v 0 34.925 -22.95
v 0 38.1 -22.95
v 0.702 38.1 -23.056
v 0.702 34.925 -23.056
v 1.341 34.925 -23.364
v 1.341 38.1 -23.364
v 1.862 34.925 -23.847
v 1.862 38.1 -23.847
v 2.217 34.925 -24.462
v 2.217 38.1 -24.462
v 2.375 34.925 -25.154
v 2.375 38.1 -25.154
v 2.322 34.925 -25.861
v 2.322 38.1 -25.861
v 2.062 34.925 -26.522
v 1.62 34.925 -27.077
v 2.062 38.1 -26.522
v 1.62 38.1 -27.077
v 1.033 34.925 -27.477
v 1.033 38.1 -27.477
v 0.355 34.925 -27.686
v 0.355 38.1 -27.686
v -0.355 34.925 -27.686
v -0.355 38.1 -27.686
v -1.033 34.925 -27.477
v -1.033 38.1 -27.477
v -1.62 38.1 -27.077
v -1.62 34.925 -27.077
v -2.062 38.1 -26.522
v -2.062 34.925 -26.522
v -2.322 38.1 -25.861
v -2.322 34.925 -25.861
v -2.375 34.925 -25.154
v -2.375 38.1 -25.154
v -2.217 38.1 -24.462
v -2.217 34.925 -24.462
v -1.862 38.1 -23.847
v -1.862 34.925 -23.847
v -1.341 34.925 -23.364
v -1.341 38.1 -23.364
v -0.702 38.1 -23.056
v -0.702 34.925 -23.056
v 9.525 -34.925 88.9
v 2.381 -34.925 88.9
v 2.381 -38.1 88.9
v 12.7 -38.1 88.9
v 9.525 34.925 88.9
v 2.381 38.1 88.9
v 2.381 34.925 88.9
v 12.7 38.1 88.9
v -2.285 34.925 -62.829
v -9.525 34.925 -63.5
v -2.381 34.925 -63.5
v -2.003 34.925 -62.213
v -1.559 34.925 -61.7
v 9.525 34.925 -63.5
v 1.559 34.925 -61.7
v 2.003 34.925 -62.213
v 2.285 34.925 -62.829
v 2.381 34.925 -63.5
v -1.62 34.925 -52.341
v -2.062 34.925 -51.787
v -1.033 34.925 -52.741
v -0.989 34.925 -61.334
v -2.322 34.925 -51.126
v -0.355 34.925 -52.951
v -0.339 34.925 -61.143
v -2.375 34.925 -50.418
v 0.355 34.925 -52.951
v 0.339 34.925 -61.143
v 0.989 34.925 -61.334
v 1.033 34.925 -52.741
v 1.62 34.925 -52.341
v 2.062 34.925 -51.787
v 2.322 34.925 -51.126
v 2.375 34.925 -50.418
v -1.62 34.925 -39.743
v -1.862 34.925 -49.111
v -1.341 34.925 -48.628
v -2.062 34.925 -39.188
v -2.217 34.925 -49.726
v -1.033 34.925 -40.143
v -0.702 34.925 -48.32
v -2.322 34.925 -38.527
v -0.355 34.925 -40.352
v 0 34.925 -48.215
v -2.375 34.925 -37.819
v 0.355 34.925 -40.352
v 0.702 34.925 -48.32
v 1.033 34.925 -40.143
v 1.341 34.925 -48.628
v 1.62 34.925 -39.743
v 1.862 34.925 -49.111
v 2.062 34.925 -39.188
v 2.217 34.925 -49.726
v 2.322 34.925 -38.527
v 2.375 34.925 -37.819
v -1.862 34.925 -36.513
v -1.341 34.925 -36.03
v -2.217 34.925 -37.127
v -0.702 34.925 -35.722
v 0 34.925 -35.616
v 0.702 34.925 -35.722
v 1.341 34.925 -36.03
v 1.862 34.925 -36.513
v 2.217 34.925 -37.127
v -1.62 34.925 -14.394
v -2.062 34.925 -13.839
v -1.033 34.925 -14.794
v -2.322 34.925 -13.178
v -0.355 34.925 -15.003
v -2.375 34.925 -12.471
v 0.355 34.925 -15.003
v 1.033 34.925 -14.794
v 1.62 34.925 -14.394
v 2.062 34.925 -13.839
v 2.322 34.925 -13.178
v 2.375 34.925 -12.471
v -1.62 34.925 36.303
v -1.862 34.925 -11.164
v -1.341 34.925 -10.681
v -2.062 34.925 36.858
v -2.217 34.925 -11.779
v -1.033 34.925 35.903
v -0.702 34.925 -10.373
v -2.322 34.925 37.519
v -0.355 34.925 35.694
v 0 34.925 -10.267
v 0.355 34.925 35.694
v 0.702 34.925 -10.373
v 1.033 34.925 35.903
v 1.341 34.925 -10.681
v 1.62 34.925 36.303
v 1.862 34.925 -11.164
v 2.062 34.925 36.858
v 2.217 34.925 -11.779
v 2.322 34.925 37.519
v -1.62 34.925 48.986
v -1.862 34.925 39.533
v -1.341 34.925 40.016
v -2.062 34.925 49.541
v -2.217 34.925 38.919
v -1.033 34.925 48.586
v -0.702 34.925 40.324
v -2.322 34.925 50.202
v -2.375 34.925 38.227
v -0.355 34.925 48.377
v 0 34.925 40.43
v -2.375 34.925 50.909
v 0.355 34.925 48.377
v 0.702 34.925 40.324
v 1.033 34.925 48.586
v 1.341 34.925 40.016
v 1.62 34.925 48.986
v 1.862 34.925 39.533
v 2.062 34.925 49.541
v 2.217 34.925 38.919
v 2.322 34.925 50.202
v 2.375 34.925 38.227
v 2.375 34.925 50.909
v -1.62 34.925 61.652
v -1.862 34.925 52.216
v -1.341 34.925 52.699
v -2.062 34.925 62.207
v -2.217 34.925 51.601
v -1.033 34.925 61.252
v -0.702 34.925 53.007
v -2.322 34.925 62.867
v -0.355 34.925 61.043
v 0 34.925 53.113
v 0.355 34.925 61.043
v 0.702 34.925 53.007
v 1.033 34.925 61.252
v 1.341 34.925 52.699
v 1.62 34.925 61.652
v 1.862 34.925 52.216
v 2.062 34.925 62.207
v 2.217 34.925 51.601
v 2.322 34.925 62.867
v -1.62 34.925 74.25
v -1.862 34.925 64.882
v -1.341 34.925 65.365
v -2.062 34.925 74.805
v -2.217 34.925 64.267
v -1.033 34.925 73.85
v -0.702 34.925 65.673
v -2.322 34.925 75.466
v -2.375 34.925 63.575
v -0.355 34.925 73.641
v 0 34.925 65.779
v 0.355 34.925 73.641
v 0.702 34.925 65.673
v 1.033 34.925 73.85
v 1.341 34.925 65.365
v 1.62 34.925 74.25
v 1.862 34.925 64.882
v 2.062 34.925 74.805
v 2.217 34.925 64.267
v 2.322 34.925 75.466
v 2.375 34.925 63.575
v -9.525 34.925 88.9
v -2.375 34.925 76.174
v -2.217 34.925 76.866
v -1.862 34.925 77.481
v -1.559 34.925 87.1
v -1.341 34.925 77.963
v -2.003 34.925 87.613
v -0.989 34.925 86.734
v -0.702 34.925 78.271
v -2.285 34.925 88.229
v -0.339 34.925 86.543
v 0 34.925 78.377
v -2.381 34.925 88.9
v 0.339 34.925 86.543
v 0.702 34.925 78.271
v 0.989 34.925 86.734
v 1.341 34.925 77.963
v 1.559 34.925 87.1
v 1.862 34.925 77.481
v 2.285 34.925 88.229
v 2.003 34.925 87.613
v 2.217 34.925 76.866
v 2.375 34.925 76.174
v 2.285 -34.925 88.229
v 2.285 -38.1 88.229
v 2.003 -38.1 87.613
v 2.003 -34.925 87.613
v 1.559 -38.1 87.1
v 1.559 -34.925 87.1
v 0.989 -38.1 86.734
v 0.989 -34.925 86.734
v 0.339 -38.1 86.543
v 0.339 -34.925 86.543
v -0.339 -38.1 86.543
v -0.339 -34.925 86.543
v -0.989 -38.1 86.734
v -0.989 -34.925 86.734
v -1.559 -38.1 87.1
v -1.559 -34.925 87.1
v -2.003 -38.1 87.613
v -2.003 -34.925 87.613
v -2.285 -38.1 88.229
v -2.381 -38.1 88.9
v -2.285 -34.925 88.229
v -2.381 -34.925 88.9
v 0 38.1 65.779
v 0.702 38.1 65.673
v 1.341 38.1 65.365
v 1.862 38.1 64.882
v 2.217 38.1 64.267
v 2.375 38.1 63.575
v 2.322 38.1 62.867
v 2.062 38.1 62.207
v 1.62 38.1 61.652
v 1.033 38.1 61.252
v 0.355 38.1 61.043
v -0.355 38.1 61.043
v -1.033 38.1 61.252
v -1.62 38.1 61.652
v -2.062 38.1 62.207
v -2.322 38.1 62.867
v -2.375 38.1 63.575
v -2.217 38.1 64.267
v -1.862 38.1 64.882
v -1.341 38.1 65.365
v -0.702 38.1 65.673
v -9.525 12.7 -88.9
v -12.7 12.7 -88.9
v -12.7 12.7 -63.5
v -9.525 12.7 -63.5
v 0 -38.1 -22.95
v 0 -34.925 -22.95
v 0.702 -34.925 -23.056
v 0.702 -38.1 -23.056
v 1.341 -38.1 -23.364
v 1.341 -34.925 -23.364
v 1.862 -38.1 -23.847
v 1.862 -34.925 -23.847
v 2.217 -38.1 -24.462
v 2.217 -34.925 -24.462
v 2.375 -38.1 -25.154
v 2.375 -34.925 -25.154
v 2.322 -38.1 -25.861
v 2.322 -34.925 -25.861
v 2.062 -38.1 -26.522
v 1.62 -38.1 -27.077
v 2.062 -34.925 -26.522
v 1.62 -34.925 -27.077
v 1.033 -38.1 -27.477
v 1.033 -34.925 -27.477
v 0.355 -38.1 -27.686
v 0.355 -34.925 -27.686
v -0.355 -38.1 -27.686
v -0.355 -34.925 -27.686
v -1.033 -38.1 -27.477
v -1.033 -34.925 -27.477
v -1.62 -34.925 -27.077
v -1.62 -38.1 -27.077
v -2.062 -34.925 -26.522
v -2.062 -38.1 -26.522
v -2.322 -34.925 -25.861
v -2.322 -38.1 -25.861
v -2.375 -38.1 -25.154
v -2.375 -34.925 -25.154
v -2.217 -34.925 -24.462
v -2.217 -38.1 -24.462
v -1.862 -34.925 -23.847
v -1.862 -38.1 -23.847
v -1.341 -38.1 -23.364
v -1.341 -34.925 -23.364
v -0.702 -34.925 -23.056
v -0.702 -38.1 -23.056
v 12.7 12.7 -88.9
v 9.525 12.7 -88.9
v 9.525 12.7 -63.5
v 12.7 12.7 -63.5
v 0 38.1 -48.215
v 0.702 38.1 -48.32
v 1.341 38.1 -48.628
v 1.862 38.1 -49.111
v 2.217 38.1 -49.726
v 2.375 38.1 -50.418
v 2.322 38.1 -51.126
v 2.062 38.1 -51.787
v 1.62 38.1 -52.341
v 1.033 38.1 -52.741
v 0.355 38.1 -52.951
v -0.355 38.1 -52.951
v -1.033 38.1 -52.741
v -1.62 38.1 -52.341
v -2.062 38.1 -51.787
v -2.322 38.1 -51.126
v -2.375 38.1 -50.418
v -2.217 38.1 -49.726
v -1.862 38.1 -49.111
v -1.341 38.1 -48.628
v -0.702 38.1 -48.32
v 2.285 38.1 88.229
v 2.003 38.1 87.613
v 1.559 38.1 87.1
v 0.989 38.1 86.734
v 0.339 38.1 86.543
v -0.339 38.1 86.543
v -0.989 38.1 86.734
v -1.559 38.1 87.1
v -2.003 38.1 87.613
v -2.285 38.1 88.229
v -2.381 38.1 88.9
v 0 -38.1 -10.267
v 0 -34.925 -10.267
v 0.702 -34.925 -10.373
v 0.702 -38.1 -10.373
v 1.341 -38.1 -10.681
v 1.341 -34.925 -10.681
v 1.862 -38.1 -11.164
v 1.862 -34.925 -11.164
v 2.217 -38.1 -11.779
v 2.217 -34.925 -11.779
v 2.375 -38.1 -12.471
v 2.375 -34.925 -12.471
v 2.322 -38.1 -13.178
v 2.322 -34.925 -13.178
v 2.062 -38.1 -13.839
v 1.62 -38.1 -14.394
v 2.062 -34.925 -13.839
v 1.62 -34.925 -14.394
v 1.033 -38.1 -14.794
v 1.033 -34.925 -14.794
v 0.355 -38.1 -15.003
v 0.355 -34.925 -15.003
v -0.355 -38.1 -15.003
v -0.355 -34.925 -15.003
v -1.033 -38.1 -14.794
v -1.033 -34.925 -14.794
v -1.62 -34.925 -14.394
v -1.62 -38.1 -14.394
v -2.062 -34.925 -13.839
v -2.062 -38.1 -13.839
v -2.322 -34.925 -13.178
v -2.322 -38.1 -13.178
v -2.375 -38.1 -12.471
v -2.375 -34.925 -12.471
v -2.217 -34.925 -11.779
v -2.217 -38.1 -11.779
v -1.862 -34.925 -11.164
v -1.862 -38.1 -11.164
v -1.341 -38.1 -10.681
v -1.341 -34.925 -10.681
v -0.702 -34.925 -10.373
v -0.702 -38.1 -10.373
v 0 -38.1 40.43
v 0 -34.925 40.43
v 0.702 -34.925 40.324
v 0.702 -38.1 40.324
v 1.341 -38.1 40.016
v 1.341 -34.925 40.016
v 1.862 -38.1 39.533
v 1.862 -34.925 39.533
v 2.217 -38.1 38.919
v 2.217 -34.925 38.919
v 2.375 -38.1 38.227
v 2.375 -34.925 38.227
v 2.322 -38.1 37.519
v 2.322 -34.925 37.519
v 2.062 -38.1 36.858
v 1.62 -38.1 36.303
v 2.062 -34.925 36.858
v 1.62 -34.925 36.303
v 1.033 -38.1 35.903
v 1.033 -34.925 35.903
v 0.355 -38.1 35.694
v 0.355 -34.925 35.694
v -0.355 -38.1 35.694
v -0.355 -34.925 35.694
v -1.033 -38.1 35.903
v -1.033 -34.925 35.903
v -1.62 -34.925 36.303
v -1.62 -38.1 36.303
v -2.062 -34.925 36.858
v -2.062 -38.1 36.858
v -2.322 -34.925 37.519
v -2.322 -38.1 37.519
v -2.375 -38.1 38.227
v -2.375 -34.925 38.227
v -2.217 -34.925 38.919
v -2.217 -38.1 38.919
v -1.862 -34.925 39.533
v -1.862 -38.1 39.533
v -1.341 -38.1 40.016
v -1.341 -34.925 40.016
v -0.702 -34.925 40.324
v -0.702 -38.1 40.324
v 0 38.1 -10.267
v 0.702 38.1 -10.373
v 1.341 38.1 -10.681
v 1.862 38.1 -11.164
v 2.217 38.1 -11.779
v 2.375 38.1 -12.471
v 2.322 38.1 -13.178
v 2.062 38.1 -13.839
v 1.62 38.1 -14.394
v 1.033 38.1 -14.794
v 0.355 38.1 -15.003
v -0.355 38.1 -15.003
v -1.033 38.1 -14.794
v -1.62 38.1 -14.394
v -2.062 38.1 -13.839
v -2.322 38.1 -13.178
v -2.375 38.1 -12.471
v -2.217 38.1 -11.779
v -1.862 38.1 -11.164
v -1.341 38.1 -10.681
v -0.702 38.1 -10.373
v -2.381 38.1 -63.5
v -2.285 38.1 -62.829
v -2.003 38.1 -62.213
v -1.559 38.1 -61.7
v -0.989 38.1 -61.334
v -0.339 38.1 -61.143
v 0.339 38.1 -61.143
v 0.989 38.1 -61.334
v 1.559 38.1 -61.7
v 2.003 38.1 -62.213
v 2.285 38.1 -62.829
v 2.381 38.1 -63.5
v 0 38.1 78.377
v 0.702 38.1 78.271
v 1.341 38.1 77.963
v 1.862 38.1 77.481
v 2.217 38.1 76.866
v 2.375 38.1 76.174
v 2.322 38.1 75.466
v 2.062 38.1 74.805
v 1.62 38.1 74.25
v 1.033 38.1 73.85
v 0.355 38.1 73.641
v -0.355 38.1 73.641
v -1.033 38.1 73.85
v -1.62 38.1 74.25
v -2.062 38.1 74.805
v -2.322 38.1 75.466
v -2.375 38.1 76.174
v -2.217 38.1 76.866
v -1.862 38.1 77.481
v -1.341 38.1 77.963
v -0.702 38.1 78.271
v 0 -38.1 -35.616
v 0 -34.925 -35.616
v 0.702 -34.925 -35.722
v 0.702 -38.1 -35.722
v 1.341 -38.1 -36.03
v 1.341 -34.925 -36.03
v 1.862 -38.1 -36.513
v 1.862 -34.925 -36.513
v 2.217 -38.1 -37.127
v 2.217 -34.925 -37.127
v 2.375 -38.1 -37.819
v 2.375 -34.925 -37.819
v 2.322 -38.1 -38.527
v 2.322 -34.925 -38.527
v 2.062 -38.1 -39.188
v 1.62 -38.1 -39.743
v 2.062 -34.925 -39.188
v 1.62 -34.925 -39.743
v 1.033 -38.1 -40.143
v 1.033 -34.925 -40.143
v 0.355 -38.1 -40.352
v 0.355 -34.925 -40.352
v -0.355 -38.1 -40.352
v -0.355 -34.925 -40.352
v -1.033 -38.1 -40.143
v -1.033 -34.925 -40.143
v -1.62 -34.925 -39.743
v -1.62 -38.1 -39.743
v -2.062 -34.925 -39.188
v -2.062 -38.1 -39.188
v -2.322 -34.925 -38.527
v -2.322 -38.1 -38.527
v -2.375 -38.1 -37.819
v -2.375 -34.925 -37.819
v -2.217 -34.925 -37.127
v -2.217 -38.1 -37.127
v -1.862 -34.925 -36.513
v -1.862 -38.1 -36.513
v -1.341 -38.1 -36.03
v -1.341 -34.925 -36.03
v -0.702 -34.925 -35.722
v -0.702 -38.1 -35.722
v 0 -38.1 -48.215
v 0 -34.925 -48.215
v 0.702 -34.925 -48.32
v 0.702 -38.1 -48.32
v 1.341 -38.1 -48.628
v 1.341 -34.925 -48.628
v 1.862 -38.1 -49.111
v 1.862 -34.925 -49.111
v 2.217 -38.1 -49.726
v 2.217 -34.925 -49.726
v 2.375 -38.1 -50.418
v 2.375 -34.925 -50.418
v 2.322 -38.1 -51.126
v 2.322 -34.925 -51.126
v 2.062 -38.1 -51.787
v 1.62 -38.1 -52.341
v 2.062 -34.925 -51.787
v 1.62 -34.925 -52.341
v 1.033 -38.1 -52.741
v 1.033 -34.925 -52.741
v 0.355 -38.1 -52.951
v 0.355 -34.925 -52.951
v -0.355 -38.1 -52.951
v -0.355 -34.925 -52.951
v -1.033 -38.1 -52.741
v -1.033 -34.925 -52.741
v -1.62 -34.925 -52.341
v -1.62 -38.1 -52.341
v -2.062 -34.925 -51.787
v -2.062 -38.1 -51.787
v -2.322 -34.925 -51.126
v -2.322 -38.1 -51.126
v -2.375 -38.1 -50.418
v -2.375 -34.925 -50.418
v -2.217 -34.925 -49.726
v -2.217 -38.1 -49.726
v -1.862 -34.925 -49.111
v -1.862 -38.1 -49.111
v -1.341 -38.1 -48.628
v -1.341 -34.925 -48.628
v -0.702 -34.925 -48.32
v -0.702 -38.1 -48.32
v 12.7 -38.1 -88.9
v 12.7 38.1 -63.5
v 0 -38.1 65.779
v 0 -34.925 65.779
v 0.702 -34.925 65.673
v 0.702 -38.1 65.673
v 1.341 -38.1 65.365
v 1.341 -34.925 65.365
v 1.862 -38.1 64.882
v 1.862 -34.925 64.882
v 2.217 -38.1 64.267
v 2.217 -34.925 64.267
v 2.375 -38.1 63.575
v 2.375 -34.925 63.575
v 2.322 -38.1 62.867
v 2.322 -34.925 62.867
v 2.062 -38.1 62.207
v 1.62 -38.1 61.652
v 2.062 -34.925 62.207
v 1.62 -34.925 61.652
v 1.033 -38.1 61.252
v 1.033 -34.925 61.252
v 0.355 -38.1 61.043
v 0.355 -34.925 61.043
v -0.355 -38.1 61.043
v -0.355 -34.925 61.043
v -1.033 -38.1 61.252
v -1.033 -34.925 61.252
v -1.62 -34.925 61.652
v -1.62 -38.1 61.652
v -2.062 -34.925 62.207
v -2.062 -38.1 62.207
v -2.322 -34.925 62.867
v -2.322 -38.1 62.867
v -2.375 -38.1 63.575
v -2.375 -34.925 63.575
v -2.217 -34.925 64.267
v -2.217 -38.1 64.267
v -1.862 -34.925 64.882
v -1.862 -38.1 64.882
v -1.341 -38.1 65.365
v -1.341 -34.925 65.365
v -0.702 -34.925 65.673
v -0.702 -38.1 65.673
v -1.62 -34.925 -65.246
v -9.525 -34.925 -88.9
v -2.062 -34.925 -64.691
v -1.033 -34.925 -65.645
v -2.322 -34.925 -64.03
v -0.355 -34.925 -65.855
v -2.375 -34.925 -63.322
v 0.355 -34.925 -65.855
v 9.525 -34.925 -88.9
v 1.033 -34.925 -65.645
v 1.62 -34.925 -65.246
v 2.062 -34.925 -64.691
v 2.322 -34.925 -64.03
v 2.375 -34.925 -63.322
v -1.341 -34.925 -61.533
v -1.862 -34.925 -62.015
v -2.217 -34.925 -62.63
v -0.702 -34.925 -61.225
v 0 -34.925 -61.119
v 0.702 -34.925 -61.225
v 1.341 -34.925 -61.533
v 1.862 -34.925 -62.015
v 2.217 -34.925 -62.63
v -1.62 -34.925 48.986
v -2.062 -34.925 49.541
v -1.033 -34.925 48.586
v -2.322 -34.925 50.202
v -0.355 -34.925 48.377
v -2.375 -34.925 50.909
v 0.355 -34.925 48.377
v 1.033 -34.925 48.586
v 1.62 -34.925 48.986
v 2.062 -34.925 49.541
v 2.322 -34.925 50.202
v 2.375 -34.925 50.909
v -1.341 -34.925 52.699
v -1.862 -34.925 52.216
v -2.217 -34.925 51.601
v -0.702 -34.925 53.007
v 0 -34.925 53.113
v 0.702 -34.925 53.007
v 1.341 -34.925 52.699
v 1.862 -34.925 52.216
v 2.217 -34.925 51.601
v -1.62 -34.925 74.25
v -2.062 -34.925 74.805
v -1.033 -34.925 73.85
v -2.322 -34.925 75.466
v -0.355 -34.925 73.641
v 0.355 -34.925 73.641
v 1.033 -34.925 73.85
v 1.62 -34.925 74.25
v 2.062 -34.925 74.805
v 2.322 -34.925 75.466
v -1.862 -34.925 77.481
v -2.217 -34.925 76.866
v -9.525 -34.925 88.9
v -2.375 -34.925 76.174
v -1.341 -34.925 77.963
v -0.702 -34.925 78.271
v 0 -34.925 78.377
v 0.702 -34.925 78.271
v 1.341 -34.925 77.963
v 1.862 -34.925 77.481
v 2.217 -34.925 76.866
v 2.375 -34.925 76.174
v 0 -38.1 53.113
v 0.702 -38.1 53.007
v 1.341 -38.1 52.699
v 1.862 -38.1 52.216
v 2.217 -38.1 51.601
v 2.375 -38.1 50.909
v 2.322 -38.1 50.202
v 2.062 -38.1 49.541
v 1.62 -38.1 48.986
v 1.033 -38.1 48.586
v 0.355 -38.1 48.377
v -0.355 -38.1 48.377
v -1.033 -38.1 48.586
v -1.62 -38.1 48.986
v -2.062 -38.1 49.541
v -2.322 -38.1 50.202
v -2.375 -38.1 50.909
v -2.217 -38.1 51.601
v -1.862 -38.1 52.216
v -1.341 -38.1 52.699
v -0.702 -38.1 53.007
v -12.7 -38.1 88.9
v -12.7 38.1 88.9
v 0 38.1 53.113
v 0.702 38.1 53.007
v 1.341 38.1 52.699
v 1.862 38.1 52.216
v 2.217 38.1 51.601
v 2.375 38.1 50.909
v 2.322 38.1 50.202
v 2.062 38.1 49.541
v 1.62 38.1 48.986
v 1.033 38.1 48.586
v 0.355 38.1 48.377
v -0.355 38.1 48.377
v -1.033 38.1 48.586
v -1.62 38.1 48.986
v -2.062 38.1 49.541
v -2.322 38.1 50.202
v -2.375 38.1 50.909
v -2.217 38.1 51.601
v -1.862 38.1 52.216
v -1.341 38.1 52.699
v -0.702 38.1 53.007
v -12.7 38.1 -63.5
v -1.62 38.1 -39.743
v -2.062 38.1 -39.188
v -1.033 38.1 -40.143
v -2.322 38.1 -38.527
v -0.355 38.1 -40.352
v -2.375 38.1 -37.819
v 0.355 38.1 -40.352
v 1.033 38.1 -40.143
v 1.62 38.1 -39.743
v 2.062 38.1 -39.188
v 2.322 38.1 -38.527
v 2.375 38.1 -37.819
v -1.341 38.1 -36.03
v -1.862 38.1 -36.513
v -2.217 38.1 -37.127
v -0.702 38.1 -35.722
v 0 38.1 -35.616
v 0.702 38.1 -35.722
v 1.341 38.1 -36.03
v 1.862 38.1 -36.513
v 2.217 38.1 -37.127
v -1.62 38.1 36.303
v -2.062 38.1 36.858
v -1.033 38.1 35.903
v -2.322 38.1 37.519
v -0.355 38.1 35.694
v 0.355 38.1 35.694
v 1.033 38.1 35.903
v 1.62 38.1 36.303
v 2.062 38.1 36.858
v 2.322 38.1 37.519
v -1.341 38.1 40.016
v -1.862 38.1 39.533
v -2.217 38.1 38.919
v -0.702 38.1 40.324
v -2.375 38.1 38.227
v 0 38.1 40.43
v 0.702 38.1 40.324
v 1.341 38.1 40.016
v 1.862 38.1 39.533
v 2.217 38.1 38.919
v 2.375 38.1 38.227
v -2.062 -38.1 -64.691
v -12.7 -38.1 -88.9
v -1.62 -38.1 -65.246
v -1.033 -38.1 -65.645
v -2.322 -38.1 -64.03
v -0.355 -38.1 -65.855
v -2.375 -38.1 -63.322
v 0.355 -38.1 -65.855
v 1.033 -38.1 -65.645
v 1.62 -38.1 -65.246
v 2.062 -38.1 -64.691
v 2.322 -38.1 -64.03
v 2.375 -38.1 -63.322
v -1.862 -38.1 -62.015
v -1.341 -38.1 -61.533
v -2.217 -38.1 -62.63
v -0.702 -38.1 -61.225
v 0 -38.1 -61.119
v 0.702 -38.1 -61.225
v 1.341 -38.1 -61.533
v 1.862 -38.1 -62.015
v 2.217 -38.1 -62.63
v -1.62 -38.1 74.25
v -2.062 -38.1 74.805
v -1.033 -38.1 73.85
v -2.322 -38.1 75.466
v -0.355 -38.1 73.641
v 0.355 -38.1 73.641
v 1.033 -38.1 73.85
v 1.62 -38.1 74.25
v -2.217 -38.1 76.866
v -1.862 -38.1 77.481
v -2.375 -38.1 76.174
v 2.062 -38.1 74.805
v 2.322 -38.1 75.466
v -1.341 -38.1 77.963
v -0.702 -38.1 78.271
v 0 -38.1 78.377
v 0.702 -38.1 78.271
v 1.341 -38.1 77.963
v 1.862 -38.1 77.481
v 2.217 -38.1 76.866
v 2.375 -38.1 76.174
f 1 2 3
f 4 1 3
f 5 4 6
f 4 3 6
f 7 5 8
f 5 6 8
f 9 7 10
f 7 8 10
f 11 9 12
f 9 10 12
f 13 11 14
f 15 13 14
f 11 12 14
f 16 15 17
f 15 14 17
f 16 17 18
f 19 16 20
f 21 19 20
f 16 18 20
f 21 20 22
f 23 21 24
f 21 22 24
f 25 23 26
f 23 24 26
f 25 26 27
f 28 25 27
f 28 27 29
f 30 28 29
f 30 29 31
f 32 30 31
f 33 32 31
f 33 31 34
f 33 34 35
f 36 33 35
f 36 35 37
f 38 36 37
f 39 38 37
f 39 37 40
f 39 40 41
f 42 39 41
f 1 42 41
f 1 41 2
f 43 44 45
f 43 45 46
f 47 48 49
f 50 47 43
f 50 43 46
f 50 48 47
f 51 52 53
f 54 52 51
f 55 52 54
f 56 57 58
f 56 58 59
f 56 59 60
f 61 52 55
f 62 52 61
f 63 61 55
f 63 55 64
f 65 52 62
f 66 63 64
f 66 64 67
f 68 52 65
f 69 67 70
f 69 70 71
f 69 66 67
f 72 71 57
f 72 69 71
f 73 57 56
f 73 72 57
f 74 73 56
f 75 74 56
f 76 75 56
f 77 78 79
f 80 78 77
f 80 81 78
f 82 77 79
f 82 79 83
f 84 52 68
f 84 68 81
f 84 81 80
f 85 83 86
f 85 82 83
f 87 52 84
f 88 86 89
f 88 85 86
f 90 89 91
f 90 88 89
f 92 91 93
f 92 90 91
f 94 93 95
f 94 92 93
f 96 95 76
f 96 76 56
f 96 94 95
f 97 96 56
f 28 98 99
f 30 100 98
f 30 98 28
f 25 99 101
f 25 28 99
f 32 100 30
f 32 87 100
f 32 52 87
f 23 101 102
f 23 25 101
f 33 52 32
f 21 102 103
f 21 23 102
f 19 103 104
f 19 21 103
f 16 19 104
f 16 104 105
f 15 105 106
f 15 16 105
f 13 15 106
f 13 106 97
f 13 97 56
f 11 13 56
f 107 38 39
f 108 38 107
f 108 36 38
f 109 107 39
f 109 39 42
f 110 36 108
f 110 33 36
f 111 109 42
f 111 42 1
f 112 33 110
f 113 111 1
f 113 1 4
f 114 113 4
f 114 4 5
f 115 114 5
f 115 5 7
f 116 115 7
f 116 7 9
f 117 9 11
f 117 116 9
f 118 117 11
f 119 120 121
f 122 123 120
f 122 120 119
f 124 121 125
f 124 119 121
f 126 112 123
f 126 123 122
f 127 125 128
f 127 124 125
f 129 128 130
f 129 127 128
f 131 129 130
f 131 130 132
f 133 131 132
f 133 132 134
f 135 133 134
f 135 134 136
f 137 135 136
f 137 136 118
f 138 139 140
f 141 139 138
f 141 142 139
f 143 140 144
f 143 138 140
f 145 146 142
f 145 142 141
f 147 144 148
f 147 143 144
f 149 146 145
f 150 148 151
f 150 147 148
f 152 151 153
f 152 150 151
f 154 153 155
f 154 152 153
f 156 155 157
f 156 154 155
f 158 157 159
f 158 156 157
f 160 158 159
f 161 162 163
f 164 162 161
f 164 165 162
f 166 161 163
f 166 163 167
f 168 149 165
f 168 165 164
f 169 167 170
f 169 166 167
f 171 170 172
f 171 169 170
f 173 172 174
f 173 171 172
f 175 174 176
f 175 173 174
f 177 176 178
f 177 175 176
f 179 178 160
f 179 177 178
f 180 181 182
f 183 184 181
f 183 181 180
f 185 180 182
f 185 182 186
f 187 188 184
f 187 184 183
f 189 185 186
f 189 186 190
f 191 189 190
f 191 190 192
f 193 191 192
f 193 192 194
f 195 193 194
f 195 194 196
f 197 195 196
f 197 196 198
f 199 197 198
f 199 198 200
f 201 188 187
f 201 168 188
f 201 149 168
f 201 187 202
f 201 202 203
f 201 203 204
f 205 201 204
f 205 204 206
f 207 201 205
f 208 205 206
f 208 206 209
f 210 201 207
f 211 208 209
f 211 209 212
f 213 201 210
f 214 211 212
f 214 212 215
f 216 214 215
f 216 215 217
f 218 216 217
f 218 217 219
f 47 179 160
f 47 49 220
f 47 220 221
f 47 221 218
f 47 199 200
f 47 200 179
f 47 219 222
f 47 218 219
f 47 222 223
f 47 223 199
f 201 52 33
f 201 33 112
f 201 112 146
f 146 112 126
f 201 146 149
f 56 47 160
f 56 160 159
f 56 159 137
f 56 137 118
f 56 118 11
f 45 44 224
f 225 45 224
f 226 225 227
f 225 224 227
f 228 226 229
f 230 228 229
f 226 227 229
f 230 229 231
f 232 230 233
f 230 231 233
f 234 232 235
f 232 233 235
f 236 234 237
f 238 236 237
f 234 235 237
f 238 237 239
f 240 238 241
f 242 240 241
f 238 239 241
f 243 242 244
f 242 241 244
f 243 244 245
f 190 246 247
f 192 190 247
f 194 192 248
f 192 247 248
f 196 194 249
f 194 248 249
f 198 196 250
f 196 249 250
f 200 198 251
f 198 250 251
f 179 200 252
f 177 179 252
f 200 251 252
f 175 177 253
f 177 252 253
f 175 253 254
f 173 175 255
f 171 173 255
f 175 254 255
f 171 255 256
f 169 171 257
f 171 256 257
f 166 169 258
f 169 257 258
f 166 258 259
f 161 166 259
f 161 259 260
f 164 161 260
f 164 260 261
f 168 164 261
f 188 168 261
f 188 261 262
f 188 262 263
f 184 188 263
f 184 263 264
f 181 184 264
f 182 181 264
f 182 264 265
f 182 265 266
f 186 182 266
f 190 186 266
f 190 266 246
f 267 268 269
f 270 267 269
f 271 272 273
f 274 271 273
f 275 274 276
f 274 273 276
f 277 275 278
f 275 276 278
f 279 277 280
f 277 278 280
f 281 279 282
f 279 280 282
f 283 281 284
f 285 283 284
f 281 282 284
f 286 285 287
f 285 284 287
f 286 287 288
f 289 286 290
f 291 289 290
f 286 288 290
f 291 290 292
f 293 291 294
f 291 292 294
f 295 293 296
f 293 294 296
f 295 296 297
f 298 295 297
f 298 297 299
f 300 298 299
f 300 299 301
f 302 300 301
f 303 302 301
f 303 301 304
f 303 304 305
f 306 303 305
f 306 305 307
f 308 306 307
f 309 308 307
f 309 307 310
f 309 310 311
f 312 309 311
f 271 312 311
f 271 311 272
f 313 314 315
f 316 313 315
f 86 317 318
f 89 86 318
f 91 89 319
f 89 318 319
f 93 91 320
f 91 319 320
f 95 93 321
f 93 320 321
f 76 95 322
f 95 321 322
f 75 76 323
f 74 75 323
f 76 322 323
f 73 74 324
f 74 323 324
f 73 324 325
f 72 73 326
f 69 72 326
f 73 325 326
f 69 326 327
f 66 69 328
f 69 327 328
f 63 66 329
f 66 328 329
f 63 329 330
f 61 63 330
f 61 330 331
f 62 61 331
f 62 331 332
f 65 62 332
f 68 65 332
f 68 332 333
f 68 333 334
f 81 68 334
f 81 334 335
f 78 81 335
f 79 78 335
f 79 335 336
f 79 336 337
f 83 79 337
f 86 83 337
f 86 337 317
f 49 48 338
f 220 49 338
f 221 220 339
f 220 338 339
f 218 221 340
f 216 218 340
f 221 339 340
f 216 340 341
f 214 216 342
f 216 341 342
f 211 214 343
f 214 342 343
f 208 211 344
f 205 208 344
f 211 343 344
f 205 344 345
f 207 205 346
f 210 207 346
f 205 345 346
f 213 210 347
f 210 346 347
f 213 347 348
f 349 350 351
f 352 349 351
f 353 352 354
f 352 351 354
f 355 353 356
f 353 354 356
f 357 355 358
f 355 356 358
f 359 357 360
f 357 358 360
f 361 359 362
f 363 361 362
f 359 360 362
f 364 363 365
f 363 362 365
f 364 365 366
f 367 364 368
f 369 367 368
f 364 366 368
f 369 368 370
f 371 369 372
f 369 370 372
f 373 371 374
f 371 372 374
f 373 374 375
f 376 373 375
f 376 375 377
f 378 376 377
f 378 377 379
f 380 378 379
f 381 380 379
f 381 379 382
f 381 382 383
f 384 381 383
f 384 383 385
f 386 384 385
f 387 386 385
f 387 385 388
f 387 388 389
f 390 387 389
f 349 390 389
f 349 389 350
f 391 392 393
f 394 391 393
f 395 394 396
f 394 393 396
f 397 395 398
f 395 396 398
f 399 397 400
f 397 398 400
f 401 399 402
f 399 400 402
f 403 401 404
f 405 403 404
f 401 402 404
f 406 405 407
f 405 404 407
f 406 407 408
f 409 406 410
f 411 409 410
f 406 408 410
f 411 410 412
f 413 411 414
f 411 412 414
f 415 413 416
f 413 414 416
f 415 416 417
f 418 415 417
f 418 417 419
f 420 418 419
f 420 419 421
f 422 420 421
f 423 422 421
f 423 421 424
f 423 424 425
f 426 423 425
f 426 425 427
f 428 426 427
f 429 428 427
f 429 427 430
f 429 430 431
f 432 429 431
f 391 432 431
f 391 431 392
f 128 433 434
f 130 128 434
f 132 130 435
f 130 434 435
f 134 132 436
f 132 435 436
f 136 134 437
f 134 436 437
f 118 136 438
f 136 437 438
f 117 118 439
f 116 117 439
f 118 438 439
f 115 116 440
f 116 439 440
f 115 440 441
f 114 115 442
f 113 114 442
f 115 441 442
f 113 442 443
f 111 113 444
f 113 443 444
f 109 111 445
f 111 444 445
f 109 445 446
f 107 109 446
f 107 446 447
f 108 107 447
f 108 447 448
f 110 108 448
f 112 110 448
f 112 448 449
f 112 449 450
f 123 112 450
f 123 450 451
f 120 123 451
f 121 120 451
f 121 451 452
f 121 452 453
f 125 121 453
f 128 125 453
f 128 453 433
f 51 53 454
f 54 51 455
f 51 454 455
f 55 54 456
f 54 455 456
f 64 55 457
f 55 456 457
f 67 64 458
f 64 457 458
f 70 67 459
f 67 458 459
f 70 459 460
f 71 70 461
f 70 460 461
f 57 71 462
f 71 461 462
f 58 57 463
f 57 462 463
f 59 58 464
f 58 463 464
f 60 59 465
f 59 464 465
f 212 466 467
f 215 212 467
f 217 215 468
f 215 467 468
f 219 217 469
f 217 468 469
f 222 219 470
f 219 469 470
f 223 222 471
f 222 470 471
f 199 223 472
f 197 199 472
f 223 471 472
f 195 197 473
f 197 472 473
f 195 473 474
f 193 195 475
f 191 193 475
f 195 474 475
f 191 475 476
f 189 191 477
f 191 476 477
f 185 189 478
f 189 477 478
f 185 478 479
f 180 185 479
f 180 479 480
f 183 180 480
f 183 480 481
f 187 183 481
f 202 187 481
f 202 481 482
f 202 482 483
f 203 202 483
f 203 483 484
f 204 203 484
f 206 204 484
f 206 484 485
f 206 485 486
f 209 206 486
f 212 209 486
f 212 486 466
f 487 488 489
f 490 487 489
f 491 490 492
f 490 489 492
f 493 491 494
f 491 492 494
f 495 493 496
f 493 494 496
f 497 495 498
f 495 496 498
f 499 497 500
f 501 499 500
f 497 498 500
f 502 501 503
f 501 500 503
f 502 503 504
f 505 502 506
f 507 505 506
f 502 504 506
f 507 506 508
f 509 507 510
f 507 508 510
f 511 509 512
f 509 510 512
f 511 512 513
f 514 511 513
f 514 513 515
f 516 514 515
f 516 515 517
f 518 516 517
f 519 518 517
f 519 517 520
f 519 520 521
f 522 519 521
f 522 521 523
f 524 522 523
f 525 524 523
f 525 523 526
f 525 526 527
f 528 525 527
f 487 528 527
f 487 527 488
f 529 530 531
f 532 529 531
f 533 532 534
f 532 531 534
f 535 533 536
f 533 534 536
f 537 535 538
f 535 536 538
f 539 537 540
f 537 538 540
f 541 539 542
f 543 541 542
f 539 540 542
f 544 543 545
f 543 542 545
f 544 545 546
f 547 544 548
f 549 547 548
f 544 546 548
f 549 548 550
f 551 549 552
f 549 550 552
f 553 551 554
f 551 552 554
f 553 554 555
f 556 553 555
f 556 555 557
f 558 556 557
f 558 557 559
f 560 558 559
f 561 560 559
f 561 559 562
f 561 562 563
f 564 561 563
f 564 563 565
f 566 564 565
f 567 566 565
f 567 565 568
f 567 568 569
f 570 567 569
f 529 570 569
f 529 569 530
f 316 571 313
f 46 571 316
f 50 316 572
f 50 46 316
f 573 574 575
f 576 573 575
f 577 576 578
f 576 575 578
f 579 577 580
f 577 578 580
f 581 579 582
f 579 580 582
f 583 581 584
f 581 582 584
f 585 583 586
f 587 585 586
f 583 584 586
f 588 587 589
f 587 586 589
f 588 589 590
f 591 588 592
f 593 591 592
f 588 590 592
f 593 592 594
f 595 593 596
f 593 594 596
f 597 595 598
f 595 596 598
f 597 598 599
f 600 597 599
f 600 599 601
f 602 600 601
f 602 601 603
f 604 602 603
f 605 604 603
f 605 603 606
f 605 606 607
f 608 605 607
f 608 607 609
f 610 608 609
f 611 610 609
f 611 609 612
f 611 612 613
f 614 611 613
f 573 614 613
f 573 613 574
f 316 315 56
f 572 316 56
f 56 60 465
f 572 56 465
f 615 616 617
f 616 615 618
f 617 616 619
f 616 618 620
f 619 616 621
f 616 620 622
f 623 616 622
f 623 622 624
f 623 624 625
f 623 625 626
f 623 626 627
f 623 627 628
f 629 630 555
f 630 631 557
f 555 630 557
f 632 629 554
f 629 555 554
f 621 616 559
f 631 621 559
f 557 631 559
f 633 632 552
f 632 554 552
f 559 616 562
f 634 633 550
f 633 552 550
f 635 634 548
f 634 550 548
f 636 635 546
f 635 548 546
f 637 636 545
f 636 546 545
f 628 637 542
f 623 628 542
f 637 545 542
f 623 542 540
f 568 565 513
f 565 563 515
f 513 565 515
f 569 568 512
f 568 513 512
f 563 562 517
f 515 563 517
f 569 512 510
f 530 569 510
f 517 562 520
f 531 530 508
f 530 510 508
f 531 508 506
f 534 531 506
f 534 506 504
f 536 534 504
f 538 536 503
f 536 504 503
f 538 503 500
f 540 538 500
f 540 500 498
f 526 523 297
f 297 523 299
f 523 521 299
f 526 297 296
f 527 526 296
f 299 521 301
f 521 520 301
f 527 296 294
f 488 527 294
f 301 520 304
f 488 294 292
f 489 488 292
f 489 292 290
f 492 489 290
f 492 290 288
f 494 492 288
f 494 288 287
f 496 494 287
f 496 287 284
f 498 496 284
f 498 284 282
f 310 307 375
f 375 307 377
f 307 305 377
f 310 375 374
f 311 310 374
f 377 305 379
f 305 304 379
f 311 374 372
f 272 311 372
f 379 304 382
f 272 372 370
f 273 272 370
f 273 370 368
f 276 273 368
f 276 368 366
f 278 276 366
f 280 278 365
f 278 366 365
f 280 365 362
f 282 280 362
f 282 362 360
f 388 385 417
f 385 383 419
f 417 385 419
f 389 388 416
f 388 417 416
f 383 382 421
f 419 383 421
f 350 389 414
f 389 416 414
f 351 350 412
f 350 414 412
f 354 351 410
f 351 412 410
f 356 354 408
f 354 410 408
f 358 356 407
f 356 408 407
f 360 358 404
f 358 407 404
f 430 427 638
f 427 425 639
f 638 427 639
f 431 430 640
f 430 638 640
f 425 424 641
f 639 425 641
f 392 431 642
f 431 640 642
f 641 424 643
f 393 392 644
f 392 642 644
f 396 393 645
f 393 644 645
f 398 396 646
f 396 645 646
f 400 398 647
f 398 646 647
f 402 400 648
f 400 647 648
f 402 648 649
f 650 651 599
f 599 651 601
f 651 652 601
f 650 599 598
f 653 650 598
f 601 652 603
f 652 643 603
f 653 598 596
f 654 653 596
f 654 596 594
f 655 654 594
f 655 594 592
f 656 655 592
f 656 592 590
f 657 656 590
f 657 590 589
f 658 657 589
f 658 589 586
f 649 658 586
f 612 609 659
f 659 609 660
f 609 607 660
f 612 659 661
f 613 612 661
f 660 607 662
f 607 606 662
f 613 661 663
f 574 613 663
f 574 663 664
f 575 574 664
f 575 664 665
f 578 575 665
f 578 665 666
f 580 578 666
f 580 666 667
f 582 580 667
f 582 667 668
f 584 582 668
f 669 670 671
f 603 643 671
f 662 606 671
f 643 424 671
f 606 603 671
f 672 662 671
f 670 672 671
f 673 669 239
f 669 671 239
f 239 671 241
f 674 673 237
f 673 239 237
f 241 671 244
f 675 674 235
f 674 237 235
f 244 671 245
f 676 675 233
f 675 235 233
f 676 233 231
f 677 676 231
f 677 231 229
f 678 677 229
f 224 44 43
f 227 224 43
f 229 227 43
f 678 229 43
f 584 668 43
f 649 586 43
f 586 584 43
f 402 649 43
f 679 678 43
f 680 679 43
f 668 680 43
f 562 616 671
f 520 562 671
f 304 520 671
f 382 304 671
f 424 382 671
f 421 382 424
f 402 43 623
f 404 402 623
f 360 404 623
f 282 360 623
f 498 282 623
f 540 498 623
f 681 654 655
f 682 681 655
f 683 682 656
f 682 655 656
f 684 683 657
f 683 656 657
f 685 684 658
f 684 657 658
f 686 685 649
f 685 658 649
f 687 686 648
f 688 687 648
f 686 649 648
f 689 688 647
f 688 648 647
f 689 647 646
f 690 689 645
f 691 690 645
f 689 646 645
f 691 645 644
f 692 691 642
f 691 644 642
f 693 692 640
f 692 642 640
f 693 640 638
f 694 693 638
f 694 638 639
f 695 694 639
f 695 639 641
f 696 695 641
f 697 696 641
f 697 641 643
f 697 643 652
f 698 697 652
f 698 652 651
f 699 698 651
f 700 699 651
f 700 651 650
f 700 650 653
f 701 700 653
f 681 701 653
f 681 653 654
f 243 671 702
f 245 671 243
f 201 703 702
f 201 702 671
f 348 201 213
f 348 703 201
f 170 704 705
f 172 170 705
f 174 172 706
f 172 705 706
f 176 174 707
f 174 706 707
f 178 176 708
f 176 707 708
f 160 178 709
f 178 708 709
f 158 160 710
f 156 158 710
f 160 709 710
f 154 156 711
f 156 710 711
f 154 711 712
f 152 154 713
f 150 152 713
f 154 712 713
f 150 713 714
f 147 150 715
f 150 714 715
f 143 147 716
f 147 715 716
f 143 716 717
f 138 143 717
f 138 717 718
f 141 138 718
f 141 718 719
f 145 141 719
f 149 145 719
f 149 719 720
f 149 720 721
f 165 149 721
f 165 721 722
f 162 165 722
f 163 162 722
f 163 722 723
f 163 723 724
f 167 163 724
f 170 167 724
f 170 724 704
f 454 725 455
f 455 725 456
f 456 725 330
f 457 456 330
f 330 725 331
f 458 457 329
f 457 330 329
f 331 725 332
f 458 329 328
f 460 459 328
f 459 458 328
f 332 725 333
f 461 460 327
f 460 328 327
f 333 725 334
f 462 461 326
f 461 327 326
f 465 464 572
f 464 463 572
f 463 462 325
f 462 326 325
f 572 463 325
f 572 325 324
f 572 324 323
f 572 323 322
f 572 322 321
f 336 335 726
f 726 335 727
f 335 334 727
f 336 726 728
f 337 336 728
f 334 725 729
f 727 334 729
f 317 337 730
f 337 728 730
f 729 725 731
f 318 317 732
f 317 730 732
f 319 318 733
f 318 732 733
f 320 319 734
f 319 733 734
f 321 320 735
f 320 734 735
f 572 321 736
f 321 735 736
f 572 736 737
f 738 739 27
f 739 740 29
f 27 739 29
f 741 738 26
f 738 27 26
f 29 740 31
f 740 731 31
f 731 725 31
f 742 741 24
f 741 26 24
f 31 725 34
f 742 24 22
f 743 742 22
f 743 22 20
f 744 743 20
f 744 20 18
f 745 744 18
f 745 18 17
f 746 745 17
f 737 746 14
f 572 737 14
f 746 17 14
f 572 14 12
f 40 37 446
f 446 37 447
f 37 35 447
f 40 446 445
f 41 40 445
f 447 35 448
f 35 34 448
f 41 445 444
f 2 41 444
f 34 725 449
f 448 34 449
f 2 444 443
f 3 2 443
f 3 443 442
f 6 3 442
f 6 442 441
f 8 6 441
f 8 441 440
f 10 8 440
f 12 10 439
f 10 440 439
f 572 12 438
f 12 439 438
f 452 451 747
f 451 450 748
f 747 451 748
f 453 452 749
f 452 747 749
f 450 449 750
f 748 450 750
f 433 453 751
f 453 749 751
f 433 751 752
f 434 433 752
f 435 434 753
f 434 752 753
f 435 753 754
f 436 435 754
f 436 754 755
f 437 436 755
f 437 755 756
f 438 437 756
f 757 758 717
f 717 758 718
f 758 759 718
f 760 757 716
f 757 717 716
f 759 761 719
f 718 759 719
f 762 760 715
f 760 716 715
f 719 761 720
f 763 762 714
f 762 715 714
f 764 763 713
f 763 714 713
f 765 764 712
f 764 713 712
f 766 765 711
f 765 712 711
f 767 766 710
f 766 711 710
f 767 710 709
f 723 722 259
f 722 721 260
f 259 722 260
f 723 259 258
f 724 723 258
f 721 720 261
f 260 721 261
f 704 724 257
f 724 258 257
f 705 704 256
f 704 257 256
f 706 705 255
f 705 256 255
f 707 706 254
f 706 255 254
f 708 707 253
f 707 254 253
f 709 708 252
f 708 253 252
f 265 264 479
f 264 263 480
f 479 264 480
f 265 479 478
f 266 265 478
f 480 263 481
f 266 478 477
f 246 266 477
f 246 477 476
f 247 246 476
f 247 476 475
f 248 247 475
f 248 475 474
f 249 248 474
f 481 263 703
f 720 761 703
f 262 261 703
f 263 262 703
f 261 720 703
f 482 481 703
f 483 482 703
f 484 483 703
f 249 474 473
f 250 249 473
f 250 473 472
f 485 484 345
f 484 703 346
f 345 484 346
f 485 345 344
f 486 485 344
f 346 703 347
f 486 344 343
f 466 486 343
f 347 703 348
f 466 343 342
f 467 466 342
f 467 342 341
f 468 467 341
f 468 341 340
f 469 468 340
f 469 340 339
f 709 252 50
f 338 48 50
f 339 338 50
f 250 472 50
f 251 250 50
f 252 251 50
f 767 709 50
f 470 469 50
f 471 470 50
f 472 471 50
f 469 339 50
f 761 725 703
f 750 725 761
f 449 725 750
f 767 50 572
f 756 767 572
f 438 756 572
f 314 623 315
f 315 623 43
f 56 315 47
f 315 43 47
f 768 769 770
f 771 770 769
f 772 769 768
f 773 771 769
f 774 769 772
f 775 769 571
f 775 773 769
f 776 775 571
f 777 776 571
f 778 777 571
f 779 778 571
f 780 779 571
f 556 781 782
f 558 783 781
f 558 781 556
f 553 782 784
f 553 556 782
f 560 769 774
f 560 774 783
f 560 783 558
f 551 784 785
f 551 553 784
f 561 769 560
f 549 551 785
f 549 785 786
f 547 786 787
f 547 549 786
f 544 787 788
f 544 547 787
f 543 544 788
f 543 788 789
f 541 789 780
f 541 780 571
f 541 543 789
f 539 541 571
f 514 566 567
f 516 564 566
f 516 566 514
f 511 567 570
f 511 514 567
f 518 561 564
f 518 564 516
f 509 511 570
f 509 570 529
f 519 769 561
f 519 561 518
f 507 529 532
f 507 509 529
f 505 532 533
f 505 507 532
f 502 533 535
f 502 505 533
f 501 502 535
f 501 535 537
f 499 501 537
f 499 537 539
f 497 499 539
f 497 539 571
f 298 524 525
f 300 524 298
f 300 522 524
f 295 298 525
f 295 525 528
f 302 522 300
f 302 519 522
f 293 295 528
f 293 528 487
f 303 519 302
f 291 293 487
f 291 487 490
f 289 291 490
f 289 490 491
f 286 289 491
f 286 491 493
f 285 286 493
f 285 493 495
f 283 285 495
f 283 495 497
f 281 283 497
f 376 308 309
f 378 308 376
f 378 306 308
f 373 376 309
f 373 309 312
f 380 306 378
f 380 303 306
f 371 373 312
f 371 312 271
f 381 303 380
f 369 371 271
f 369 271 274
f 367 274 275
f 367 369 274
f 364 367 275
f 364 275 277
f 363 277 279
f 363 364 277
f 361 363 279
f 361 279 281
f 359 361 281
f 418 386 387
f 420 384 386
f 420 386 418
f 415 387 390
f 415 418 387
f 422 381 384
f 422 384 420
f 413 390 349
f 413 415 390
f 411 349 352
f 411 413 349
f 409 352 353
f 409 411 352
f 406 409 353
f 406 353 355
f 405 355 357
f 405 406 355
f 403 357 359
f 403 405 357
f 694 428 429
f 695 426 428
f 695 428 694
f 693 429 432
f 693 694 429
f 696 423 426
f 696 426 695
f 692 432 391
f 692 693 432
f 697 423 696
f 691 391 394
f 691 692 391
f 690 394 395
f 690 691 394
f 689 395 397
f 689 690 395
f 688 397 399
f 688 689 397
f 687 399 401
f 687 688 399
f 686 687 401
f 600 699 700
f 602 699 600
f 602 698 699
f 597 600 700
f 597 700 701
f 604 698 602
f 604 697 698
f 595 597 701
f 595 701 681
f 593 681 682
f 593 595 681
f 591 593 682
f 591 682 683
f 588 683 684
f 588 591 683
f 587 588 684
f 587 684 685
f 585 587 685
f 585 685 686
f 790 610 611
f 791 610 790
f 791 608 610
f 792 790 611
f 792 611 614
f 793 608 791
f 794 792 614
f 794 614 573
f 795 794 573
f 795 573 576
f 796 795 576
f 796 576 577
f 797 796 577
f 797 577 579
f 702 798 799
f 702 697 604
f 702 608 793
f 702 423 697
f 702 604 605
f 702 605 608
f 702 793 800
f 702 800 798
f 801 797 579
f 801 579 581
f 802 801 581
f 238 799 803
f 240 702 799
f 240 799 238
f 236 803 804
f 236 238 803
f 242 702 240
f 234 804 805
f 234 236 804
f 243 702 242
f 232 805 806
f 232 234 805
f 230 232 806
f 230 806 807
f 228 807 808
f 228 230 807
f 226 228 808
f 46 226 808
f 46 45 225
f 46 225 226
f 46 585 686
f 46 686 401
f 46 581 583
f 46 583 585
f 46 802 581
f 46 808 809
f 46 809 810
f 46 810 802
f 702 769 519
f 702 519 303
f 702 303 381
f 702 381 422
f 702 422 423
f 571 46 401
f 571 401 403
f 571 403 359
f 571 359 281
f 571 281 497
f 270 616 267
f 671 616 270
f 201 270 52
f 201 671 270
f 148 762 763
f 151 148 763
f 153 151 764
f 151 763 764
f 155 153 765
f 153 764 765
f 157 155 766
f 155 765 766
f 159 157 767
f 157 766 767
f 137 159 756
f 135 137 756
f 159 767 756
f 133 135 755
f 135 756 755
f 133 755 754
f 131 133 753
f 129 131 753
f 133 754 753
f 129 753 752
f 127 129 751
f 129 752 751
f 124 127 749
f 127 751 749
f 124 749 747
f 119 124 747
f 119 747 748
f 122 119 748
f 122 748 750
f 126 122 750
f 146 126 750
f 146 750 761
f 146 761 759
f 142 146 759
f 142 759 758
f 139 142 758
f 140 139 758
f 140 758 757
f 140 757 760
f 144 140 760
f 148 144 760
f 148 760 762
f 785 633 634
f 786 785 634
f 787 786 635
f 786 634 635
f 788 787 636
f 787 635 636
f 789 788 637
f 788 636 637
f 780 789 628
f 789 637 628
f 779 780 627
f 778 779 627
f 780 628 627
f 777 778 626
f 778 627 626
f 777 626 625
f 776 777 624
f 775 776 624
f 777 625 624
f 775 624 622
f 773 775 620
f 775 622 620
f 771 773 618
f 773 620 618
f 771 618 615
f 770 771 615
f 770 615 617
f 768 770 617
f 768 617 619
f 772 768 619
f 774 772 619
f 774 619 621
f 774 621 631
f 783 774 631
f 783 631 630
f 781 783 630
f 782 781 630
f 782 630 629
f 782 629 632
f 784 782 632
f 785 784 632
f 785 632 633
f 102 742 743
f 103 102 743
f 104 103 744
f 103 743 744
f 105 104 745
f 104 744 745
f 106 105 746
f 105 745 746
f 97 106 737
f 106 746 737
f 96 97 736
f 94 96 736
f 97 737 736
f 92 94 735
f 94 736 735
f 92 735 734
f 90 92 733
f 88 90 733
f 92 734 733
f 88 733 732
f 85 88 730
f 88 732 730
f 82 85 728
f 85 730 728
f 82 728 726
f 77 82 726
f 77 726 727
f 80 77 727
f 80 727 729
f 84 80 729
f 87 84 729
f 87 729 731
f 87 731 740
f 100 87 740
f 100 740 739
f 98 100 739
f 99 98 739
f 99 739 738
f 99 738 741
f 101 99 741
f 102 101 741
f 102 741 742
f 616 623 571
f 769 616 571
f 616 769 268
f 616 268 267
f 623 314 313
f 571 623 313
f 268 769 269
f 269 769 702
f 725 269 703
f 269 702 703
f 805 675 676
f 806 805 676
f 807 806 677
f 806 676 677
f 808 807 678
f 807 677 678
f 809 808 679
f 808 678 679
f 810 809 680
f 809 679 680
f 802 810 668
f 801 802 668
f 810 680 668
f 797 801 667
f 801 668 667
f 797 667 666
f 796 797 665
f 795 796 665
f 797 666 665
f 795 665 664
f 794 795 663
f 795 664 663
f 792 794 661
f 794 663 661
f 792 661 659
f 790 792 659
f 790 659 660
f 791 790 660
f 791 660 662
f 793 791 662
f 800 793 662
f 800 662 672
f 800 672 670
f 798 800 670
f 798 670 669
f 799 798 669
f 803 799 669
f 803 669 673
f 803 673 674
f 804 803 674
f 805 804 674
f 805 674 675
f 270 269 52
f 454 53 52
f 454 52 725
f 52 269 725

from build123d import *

# Parameters (mm, degrees)
SKETCH1_W           = 25.4
SKETCH1_H           = 76.2
BOSS_EXTRUDE1_DEPTH = 88.9
SHELL1_T            = -3.175
SKETCH2_W           = 25.4
SKETCH2_H           = 25.4
CUT_EXTRUDE1_DEPTH  = 100.9999
SKETCH3_R           = 2.38125
CUT_EXTRUDE2_DEPTH  = 118.774954893


with BuildPart() as part:
    # Sketch1 → Boss-Extrude1 (new, symmetric)
    with BuildSketch(Plane.XY):
        Rectangle(SKETCH1_W, SKETCH1_H)
    extrude(amount=BOSS_EXTRUDE1_DEPTH, both=True)

    # Shell1
    shell1_openings = [part.faces().sort_by_distance(p)[0] for p in [
        (0, 0, 88.9),
        (0, 0, -88.9),
    ]]
    offset(amount=SHELL1_T, openings=shell1_openings, kind=Kind.INTERSECTION)

    # Sketch2 → Cut-Extrude1 (cut, through all)
    with BuildSketch(Plane.ZY.offset(12.7)):
        with Locations((-76.2, 25.4)):
            Rectangle(SKETCH2_W, SKETCH2_H)
    extrude(amount=-CUT_EXTRUDE1_DEPTH, mode=Mode.SUBTRACT)

    # Sketch3 → Cut-Extrude2 (cut, through all)
    with BuildSketch(Plane(origin=(0, 38.1, 0), x_dir=(1, 0, 0), z_dir=(0, 1, 0))):
        with Locations((0, -88.9)):
            Circle(SKETCH3_R)
        with Locations(Location((0, -75.995900078, 0), (0, 0, 270))):
            Circle(SKETCH3_R)
        with Locations(Location((0, -63.397337518, 0), (0, 0, 270))):
            Circle(SKETCH3_R)
        with Locations(Location((0, -50.731481722, 0), (0, 0, 270))):
            Circle(SKETCH3_R)
        with Locations(Location((0, -38.048590908, 0), (0, 0, 270))):
            Circle(SKETCH3_R)
        with Locations(Location((0, 63.5, 0), (0, 0, 270))):
            Circle(SKETCH3_R)
        with Locations(Location((0, 12.648590908, 0), (0, 0, 270))):
            Circle(SKETCH3_R)
        with Locations(Location((0, 25.331481722, 0), (0, 0, 270))):
            Circle(SKETCH3_R)
        with Locations(Location((0, 37.997337518, 0), (0, 0, 270))):
            Circle(SKETCH3_R)
        with Locations(Location((0, 50.595900078, 0), (0, 0, 270))):
            Circle(SKETCH3_R)
    extrude(amount=-CUT_EXTRUDE2_DEPTH, mode=Mode.SUBTRACT)


solid = part.part
